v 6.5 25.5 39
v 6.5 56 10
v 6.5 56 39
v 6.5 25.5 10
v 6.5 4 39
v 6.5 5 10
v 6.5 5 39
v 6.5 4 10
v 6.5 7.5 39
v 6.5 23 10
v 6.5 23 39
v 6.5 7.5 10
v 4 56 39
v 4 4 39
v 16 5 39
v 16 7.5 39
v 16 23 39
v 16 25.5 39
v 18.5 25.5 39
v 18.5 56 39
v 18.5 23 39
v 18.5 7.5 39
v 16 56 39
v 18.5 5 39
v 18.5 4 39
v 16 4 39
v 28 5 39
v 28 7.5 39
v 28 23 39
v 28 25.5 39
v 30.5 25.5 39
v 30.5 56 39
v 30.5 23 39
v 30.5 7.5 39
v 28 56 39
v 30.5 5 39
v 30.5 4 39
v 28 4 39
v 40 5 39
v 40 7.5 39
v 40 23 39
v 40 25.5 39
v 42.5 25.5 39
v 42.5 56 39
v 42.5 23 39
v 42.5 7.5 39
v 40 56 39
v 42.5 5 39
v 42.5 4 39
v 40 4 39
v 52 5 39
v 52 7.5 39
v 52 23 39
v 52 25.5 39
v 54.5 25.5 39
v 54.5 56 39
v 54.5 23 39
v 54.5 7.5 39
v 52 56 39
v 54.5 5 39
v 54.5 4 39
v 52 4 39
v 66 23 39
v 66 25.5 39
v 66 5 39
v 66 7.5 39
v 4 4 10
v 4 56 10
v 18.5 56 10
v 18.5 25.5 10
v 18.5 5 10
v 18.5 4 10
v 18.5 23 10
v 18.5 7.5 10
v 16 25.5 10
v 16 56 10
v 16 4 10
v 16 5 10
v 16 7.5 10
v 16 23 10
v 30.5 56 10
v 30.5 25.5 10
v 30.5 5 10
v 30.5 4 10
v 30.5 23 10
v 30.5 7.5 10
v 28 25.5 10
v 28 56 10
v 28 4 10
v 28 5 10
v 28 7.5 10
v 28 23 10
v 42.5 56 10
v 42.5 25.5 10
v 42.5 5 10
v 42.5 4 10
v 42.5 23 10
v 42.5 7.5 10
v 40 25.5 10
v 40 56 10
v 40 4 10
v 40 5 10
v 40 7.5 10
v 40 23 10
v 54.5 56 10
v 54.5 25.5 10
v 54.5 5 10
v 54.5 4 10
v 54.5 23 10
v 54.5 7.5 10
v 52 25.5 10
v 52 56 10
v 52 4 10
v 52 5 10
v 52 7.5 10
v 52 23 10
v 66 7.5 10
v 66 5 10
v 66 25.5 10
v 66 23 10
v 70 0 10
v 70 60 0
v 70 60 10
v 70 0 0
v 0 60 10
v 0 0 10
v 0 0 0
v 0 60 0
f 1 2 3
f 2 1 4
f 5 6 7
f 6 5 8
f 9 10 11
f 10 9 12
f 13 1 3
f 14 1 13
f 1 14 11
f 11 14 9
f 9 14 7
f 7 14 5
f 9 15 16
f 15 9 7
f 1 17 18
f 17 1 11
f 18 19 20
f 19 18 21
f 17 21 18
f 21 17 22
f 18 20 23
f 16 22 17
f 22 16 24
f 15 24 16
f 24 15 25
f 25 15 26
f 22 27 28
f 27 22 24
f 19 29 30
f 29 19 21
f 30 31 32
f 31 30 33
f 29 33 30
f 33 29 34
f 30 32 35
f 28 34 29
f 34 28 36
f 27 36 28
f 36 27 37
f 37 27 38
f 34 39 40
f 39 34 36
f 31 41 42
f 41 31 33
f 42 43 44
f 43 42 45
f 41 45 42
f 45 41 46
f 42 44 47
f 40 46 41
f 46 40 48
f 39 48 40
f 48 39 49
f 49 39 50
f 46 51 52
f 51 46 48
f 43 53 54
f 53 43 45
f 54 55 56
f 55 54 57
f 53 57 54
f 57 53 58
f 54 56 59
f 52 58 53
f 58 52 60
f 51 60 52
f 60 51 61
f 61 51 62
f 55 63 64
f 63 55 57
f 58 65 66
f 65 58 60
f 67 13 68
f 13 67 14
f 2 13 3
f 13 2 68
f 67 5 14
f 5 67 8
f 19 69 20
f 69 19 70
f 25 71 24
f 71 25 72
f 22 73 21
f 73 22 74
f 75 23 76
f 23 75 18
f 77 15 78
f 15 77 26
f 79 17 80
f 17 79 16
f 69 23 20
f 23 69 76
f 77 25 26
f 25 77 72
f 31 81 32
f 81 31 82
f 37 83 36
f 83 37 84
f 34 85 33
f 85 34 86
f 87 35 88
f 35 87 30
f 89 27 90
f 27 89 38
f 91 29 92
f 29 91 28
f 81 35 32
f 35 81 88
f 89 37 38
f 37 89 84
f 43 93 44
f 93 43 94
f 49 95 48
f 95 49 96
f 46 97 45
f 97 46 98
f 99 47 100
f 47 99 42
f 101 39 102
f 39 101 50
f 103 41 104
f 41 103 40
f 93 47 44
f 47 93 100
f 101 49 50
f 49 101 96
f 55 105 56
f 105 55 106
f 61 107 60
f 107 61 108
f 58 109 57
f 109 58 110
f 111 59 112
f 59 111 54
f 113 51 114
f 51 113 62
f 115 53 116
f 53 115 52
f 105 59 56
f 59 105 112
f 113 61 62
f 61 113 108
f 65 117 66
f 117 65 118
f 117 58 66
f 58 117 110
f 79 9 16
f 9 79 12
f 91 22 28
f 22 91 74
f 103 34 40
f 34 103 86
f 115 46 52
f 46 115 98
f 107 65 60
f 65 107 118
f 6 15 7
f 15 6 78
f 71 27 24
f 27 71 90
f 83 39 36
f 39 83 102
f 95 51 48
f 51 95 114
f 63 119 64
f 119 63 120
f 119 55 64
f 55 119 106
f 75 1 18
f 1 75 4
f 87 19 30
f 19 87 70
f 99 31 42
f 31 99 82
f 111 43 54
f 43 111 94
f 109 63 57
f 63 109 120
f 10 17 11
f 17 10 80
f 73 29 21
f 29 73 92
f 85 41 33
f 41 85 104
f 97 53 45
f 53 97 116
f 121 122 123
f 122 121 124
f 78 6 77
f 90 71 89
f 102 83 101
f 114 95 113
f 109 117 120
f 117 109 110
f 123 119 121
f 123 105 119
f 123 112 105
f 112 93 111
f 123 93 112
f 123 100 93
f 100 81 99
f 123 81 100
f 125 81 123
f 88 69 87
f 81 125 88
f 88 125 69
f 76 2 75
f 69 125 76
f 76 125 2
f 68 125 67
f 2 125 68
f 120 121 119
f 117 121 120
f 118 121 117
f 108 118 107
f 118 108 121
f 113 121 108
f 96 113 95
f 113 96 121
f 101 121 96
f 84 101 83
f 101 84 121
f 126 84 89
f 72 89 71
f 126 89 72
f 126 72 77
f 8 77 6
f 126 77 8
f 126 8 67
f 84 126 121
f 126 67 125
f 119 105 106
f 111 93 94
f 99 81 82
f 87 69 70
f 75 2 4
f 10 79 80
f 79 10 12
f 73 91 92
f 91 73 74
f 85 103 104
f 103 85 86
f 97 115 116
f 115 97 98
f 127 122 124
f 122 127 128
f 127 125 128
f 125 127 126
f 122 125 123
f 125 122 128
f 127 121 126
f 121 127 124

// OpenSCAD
$fn = 32;

// ----------------------------------------------------------------------
// Heatsink: cross fin block
// ----------------------------------------------------------------------

// --- parameters (mm) ---
base_l = 70;              // base length, X
base_w = 60;              // base width, Y
base_t = 10;              // base plate thickness
fin_h = 30;               // fin height above the base
fin_t = 2.5;              // fin thickness
edge = 4;                 // margin from the base ends
pitch = 12;               // fin pitch
rib_pitch = 18;           // cross rib pitch

n_fins = floor((base_l - 2 * edge - fin_t) / pitch) + 1;  // fin count
total_h = base_t + fin_h - 1;  // overall height
n_ribs = floor((base_w - 2 * edge) / rib_pitch);  // rib count

union() {
  cube([base_l, base_w, base_t]);
  for (i = [0 : n_fins - 1])
    translate([edge + i * pitch, edge, base_t - 1])
      cube([fin_t, base_w - 2 * edge, fin_h]);
  for (i = [0 : n_ribs - 1])
    translate([edge, edge + 1 + i * rib_pitch, base_t - 1])
      cube([base_l - 2 * edge, fin_t, fin_h]);
}
